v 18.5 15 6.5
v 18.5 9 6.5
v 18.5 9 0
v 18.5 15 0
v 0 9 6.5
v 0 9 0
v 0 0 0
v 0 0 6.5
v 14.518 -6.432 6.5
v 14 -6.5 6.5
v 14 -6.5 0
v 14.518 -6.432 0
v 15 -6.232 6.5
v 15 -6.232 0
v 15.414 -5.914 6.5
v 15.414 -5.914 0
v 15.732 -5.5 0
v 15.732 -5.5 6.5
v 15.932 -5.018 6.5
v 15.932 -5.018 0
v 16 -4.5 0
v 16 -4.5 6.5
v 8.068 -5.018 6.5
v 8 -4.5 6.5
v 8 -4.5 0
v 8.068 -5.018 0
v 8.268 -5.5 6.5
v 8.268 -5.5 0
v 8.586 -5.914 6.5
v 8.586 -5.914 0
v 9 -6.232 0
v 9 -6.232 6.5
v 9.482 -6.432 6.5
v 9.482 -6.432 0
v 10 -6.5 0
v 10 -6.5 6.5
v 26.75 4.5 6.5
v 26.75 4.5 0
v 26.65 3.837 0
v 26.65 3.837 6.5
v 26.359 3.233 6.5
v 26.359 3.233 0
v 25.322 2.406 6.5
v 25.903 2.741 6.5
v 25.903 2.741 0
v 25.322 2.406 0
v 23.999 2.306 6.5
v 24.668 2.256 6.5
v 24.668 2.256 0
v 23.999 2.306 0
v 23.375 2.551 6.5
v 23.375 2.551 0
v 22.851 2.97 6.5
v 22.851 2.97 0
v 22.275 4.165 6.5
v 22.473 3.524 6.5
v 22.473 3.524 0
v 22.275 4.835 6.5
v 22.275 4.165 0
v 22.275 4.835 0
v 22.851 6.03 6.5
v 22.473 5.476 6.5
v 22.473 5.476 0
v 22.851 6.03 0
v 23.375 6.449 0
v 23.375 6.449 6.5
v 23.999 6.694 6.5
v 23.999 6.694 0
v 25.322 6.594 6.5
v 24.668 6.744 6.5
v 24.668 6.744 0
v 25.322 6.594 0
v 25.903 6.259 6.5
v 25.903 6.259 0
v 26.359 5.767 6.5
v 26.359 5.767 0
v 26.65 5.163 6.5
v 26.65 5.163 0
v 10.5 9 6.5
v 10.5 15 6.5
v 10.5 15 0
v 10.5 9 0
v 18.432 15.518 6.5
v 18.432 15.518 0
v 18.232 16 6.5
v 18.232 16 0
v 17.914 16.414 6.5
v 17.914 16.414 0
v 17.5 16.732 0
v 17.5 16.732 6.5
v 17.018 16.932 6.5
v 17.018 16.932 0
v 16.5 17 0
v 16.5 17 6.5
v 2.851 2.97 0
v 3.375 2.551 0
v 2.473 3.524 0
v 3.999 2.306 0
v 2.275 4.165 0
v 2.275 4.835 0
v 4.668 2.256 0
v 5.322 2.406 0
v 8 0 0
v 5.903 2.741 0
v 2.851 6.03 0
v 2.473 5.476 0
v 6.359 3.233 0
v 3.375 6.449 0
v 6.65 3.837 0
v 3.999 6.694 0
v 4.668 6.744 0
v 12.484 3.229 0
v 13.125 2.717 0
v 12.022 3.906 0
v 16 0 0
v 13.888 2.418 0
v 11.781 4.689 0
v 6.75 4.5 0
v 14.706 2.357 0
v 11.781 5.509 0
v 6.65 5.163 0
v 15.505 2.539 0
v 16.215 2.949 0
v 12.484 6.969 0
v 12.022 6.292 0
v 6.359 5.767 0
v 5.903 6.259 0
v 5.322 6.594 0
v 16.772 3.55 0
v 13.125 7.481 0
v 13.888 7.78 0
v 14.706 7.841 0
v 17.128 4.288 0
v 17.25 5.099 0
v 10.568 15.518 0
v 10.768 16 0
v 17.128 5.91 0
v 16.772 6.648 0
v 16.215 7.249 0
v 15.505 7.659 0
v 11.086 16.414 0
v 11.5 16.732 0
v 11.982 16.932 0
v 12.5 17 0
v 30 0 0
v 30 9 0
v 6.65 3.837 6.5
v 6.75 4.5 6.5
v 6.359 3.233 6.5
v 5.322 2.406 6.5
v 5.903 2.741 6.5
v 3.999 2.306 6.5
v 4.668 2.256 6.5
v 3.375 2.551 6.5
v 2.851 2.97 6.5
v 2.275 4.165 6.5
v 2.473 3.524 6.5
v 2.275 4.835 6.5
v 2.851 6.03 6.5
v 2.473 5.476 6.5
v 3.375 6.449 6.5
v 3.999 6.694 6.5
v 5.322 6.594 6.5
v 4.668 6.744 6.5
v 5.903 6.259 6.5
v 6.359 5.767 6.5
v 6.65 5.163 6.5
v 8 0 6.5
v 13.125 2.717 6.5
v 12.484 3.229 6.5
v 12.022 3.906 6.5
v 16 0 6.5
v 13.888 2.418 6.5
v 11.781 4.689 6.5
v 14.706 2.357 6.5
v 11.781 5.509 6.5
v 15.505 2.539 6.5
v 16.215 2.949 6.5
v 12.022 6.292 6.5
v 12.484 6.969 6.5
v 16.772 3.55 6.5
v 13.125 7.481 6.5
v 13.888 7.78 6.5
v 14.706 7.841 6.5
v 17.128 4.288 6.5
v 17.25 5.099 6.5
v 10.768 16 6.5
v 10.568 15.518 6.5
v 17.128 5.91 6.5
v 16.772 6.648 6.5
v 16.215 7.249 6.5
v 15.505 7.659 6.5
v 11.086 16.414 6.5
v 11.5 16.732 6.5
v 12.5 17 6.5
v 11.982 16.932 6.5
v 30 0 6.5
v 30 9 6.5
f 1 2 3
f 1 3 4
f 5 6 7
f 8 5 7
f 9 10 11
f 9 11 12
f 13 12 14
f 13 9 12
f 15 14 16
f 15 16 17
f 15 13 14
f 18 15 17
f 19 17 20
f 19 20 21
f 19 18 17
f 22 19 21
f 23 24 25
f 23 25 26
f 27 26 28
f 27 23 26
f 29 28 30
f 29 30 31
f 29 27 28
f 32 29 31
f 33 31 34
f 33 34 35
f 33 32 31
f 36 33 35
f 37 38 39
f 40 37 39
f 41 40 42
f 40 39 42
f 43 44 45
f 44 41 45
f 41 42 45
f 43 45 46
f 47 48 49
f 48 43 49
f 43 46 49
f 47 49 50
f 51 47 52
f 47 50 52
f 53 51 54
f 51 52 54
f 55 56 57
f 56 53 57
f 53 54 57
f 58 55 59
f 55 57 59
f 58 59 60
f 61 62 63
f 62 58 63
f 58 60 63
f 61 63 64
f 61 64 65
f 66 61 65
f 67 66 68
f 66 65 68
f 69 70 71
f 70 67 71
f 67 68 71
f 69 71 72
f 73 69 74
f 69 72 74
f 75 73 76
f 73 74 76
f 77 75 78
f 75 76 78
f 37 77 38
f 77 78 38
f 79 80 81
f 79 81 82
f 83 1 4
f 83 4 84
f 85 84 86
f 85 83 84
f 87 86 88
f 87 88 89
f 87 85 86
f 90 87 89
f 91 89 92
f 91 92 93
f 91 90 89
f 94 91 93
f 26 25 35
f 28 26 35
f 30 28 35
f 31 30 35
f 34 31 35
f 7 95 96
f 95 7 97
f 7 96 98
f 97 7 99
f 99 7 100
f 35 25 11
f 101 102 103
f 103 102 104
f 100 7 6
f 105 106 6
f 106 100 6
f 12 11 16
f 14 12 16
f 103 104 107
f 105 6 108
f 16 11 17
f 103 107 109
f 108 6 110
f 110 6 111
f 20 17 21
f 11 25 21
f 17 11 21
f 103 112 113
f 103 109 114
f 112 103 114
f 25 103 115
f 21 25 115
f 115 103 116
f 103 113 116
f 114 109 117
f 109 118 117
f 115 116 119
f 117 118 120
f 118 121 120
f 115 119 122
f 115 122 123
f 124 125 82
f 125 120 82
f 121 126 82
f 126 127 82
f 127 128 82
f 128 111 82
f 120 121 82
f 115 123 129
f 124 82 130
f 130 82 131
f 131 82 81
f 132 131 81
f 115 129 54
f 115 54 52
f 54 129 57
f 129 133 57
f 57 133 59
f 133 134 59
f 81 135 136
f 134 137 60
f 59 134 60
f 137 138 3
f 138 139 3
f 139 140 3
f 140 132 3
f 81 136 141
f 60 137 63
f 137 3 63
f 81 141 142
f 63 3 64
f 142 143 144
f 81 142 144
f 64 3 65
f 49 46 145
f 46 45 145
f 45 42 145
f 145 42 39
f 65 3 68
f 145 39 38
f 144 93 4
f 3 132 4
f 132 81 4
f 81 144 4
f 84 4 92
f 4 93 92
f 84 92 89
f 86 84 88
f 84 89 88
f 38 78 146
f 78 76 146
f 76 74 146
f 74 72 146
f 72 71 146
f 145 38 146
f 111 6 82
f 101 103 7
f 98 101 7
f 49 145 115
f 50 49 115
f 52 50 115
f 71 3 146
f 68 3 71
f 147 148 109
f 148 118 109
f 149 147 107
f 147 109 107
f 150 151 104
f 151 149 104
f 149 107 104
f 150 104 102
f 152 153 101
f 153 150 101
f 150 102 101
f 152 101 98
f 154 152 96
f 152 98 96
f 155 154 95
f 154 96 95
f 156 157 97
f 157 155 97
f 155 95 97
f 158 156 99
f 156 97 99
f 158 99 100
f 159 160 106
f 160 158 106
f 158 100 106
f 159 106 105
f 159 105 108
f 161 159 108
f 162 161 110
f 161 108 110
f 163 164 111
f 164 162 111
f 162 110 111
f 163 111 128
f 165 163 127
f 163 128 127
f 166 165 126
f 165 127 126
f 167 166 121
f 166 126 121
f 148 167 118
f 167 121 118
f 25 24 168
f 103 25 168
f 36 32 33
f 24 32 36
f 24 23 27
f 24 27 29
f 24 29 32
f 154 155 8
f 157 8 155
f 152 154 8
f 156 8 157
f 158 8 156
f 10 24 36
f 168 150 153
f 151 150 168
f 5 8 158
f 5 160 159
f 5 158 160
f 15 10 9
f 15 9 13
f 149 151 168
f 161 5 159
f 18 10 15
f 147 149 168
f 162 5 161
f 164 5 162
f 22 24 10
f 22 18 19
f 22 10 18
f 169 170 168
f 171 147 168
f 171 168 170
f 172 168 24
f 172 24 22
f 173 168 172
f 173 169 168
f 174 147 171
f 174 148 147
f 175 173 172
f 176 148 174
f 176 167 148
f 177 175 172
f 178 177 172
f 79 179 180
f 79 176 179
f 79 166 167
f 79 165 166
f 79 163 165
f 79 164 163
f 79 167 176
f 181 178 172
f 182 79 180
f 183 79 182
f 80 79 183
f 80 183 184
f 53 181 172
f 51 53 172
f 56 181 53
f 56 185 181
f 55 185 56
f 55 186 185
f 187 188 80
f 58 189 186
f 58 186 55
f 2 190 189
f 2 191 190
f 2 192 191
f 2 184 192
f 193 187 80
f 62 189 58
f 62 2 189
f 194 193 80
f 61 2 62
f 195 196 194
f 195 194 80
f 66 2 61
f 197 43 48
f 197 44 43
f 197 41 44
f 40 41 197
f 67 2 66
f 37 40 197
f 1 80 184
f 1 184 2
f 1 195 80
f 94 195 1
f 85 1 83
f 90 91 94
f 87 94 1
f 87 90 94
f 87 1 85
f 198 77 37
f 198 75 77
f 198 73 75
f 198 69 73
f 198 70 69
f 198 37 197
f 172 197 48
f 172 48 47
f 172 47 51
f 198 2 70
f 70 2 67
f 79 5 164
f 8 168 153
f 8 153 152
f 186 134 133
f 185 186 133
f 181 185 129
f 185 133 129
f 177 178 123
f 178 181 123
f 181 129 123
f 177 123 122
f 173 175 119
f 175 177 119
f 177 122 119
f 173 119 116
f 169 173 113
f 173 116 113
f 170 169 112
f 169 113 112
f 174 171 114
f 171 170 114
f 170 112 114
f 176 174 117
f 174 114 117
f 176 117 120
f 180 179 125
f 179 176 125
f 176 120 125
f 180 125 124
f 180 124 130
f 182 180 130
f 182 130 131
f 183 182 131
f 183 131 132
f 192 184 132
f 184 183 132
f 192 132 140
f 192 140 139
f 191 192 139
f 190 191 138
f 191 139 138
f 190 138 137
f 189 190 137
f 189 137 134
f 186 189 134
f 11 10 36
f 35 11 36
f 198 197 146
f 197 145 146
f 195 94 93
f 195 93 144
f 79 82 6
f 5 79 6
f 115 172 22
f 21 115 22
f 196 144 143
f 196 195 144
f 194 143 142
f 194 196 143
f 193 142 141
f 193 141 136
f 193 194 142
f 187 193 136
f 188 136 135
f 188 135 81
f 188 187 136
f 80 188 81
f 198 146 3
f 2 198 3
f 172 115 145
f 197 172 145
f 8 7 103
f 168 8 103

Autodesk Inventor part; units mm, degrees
ref_plane "YZ Plane" through (0, 0, 0) normal (1, 0, 0) x (0, 1, 0)
ref_plane "XZ Plane" through (0, 0, 0) normal (0, 1, 0) x (-1, 0, 0)
ref_plane "XY Plane" through (0, 0, 0) normal (0, 0, 1) x (1, 0, 0)
sketch "Sketch1" plane through (0, 0, 0) normal (0, 0, 1) x (1, 0, 0)
  line L0 (0, 0) -> (30, 0)
  line L1 (30, 0) -> (30, 9)
  line L2 (30, 9) -> (0, 9)
  line L3 (0, 9) -> (0, 0)
  circle A0 centre (-5.5, 5.099) radius 7.5 construction
  circle A1 centre (-5.5, 5.099) radius 4 construction
  circle A2 centre (14.5, 5.099) radius 2.75
  circle A3 centre (24.5, 4.5) radius 2.25
  circle A4 centre (4.5, 4.5) radius 2.25
  point P0 (-11, 0)
  point P1 (30, 4.5)
  dimension "d0" = 9
  dimension "d1" = 30
  dimension "d2" = 15
  dimension "d3" = 8
  dimension "d4" = 11
  dimension "d5" = 5.5
  dimension "d6" = 4.5
  dimension "d7" = 4.5
  dimension "d8" = 5.5
  dimension "d9" = 10
  dimension "d10" = 10
extrude "Extrusion1" add sketch "Sketch1" along normal blind 6.5
sketch "Sketch2" plane through (0, 0, 6.5) normal (0, 0, 1) x (1, 0, 0)
  line L0 (0, 0) -> (30, 0) projected
  line L1 (30, 0) -> (30, 9) projected
  line L2 (30, 9) -> (0, 9) projected
  line L3 (8, 0) -> (16, 0)
  line L4 (16, 0) -> (16, -4.5)
  line L5 (14, -6.5) -> (10, -6.5)
  line L6 (8, -4.5) -> (8, 0)
  arc A0 (8, -4.5) -> (10, -6.5) centre (10, -4.5) ccw
  arc A1 (14, -6.5) -> (16, -4.5) centre (14, -4.5) ccw
  line L7 (10.5, 9) -> (18.5, 9)
  line L8 (18.5, 9) -> (18.5, 15)
  line L9 (16.5, 17) -> (12.5, 17)
  line L10 (10.5, 15) -> (10.5, 9)
  arc A2 (12.5, 17) -> (10.5, 15) centre (12.5, 15) ccw
  arc A3 (18.5, 15) -> (16.5, 17) centre (16.5, 15) ccw
  dimension "d13" = 2
  dimension "d14" = 8
  dimension "d15" = 6.5
  dimension "d16" = 14
  dimension "d17" = 2
  dimension "d18" = 8
  dimension "d19" = 8
  dimension "d20" = 11.5
extrude "Extrusion2" add sketch "Sketch2" against normal blind 6.5
properties part number "x_motor_lower_nut_stop" material "Plywood, Finish"
